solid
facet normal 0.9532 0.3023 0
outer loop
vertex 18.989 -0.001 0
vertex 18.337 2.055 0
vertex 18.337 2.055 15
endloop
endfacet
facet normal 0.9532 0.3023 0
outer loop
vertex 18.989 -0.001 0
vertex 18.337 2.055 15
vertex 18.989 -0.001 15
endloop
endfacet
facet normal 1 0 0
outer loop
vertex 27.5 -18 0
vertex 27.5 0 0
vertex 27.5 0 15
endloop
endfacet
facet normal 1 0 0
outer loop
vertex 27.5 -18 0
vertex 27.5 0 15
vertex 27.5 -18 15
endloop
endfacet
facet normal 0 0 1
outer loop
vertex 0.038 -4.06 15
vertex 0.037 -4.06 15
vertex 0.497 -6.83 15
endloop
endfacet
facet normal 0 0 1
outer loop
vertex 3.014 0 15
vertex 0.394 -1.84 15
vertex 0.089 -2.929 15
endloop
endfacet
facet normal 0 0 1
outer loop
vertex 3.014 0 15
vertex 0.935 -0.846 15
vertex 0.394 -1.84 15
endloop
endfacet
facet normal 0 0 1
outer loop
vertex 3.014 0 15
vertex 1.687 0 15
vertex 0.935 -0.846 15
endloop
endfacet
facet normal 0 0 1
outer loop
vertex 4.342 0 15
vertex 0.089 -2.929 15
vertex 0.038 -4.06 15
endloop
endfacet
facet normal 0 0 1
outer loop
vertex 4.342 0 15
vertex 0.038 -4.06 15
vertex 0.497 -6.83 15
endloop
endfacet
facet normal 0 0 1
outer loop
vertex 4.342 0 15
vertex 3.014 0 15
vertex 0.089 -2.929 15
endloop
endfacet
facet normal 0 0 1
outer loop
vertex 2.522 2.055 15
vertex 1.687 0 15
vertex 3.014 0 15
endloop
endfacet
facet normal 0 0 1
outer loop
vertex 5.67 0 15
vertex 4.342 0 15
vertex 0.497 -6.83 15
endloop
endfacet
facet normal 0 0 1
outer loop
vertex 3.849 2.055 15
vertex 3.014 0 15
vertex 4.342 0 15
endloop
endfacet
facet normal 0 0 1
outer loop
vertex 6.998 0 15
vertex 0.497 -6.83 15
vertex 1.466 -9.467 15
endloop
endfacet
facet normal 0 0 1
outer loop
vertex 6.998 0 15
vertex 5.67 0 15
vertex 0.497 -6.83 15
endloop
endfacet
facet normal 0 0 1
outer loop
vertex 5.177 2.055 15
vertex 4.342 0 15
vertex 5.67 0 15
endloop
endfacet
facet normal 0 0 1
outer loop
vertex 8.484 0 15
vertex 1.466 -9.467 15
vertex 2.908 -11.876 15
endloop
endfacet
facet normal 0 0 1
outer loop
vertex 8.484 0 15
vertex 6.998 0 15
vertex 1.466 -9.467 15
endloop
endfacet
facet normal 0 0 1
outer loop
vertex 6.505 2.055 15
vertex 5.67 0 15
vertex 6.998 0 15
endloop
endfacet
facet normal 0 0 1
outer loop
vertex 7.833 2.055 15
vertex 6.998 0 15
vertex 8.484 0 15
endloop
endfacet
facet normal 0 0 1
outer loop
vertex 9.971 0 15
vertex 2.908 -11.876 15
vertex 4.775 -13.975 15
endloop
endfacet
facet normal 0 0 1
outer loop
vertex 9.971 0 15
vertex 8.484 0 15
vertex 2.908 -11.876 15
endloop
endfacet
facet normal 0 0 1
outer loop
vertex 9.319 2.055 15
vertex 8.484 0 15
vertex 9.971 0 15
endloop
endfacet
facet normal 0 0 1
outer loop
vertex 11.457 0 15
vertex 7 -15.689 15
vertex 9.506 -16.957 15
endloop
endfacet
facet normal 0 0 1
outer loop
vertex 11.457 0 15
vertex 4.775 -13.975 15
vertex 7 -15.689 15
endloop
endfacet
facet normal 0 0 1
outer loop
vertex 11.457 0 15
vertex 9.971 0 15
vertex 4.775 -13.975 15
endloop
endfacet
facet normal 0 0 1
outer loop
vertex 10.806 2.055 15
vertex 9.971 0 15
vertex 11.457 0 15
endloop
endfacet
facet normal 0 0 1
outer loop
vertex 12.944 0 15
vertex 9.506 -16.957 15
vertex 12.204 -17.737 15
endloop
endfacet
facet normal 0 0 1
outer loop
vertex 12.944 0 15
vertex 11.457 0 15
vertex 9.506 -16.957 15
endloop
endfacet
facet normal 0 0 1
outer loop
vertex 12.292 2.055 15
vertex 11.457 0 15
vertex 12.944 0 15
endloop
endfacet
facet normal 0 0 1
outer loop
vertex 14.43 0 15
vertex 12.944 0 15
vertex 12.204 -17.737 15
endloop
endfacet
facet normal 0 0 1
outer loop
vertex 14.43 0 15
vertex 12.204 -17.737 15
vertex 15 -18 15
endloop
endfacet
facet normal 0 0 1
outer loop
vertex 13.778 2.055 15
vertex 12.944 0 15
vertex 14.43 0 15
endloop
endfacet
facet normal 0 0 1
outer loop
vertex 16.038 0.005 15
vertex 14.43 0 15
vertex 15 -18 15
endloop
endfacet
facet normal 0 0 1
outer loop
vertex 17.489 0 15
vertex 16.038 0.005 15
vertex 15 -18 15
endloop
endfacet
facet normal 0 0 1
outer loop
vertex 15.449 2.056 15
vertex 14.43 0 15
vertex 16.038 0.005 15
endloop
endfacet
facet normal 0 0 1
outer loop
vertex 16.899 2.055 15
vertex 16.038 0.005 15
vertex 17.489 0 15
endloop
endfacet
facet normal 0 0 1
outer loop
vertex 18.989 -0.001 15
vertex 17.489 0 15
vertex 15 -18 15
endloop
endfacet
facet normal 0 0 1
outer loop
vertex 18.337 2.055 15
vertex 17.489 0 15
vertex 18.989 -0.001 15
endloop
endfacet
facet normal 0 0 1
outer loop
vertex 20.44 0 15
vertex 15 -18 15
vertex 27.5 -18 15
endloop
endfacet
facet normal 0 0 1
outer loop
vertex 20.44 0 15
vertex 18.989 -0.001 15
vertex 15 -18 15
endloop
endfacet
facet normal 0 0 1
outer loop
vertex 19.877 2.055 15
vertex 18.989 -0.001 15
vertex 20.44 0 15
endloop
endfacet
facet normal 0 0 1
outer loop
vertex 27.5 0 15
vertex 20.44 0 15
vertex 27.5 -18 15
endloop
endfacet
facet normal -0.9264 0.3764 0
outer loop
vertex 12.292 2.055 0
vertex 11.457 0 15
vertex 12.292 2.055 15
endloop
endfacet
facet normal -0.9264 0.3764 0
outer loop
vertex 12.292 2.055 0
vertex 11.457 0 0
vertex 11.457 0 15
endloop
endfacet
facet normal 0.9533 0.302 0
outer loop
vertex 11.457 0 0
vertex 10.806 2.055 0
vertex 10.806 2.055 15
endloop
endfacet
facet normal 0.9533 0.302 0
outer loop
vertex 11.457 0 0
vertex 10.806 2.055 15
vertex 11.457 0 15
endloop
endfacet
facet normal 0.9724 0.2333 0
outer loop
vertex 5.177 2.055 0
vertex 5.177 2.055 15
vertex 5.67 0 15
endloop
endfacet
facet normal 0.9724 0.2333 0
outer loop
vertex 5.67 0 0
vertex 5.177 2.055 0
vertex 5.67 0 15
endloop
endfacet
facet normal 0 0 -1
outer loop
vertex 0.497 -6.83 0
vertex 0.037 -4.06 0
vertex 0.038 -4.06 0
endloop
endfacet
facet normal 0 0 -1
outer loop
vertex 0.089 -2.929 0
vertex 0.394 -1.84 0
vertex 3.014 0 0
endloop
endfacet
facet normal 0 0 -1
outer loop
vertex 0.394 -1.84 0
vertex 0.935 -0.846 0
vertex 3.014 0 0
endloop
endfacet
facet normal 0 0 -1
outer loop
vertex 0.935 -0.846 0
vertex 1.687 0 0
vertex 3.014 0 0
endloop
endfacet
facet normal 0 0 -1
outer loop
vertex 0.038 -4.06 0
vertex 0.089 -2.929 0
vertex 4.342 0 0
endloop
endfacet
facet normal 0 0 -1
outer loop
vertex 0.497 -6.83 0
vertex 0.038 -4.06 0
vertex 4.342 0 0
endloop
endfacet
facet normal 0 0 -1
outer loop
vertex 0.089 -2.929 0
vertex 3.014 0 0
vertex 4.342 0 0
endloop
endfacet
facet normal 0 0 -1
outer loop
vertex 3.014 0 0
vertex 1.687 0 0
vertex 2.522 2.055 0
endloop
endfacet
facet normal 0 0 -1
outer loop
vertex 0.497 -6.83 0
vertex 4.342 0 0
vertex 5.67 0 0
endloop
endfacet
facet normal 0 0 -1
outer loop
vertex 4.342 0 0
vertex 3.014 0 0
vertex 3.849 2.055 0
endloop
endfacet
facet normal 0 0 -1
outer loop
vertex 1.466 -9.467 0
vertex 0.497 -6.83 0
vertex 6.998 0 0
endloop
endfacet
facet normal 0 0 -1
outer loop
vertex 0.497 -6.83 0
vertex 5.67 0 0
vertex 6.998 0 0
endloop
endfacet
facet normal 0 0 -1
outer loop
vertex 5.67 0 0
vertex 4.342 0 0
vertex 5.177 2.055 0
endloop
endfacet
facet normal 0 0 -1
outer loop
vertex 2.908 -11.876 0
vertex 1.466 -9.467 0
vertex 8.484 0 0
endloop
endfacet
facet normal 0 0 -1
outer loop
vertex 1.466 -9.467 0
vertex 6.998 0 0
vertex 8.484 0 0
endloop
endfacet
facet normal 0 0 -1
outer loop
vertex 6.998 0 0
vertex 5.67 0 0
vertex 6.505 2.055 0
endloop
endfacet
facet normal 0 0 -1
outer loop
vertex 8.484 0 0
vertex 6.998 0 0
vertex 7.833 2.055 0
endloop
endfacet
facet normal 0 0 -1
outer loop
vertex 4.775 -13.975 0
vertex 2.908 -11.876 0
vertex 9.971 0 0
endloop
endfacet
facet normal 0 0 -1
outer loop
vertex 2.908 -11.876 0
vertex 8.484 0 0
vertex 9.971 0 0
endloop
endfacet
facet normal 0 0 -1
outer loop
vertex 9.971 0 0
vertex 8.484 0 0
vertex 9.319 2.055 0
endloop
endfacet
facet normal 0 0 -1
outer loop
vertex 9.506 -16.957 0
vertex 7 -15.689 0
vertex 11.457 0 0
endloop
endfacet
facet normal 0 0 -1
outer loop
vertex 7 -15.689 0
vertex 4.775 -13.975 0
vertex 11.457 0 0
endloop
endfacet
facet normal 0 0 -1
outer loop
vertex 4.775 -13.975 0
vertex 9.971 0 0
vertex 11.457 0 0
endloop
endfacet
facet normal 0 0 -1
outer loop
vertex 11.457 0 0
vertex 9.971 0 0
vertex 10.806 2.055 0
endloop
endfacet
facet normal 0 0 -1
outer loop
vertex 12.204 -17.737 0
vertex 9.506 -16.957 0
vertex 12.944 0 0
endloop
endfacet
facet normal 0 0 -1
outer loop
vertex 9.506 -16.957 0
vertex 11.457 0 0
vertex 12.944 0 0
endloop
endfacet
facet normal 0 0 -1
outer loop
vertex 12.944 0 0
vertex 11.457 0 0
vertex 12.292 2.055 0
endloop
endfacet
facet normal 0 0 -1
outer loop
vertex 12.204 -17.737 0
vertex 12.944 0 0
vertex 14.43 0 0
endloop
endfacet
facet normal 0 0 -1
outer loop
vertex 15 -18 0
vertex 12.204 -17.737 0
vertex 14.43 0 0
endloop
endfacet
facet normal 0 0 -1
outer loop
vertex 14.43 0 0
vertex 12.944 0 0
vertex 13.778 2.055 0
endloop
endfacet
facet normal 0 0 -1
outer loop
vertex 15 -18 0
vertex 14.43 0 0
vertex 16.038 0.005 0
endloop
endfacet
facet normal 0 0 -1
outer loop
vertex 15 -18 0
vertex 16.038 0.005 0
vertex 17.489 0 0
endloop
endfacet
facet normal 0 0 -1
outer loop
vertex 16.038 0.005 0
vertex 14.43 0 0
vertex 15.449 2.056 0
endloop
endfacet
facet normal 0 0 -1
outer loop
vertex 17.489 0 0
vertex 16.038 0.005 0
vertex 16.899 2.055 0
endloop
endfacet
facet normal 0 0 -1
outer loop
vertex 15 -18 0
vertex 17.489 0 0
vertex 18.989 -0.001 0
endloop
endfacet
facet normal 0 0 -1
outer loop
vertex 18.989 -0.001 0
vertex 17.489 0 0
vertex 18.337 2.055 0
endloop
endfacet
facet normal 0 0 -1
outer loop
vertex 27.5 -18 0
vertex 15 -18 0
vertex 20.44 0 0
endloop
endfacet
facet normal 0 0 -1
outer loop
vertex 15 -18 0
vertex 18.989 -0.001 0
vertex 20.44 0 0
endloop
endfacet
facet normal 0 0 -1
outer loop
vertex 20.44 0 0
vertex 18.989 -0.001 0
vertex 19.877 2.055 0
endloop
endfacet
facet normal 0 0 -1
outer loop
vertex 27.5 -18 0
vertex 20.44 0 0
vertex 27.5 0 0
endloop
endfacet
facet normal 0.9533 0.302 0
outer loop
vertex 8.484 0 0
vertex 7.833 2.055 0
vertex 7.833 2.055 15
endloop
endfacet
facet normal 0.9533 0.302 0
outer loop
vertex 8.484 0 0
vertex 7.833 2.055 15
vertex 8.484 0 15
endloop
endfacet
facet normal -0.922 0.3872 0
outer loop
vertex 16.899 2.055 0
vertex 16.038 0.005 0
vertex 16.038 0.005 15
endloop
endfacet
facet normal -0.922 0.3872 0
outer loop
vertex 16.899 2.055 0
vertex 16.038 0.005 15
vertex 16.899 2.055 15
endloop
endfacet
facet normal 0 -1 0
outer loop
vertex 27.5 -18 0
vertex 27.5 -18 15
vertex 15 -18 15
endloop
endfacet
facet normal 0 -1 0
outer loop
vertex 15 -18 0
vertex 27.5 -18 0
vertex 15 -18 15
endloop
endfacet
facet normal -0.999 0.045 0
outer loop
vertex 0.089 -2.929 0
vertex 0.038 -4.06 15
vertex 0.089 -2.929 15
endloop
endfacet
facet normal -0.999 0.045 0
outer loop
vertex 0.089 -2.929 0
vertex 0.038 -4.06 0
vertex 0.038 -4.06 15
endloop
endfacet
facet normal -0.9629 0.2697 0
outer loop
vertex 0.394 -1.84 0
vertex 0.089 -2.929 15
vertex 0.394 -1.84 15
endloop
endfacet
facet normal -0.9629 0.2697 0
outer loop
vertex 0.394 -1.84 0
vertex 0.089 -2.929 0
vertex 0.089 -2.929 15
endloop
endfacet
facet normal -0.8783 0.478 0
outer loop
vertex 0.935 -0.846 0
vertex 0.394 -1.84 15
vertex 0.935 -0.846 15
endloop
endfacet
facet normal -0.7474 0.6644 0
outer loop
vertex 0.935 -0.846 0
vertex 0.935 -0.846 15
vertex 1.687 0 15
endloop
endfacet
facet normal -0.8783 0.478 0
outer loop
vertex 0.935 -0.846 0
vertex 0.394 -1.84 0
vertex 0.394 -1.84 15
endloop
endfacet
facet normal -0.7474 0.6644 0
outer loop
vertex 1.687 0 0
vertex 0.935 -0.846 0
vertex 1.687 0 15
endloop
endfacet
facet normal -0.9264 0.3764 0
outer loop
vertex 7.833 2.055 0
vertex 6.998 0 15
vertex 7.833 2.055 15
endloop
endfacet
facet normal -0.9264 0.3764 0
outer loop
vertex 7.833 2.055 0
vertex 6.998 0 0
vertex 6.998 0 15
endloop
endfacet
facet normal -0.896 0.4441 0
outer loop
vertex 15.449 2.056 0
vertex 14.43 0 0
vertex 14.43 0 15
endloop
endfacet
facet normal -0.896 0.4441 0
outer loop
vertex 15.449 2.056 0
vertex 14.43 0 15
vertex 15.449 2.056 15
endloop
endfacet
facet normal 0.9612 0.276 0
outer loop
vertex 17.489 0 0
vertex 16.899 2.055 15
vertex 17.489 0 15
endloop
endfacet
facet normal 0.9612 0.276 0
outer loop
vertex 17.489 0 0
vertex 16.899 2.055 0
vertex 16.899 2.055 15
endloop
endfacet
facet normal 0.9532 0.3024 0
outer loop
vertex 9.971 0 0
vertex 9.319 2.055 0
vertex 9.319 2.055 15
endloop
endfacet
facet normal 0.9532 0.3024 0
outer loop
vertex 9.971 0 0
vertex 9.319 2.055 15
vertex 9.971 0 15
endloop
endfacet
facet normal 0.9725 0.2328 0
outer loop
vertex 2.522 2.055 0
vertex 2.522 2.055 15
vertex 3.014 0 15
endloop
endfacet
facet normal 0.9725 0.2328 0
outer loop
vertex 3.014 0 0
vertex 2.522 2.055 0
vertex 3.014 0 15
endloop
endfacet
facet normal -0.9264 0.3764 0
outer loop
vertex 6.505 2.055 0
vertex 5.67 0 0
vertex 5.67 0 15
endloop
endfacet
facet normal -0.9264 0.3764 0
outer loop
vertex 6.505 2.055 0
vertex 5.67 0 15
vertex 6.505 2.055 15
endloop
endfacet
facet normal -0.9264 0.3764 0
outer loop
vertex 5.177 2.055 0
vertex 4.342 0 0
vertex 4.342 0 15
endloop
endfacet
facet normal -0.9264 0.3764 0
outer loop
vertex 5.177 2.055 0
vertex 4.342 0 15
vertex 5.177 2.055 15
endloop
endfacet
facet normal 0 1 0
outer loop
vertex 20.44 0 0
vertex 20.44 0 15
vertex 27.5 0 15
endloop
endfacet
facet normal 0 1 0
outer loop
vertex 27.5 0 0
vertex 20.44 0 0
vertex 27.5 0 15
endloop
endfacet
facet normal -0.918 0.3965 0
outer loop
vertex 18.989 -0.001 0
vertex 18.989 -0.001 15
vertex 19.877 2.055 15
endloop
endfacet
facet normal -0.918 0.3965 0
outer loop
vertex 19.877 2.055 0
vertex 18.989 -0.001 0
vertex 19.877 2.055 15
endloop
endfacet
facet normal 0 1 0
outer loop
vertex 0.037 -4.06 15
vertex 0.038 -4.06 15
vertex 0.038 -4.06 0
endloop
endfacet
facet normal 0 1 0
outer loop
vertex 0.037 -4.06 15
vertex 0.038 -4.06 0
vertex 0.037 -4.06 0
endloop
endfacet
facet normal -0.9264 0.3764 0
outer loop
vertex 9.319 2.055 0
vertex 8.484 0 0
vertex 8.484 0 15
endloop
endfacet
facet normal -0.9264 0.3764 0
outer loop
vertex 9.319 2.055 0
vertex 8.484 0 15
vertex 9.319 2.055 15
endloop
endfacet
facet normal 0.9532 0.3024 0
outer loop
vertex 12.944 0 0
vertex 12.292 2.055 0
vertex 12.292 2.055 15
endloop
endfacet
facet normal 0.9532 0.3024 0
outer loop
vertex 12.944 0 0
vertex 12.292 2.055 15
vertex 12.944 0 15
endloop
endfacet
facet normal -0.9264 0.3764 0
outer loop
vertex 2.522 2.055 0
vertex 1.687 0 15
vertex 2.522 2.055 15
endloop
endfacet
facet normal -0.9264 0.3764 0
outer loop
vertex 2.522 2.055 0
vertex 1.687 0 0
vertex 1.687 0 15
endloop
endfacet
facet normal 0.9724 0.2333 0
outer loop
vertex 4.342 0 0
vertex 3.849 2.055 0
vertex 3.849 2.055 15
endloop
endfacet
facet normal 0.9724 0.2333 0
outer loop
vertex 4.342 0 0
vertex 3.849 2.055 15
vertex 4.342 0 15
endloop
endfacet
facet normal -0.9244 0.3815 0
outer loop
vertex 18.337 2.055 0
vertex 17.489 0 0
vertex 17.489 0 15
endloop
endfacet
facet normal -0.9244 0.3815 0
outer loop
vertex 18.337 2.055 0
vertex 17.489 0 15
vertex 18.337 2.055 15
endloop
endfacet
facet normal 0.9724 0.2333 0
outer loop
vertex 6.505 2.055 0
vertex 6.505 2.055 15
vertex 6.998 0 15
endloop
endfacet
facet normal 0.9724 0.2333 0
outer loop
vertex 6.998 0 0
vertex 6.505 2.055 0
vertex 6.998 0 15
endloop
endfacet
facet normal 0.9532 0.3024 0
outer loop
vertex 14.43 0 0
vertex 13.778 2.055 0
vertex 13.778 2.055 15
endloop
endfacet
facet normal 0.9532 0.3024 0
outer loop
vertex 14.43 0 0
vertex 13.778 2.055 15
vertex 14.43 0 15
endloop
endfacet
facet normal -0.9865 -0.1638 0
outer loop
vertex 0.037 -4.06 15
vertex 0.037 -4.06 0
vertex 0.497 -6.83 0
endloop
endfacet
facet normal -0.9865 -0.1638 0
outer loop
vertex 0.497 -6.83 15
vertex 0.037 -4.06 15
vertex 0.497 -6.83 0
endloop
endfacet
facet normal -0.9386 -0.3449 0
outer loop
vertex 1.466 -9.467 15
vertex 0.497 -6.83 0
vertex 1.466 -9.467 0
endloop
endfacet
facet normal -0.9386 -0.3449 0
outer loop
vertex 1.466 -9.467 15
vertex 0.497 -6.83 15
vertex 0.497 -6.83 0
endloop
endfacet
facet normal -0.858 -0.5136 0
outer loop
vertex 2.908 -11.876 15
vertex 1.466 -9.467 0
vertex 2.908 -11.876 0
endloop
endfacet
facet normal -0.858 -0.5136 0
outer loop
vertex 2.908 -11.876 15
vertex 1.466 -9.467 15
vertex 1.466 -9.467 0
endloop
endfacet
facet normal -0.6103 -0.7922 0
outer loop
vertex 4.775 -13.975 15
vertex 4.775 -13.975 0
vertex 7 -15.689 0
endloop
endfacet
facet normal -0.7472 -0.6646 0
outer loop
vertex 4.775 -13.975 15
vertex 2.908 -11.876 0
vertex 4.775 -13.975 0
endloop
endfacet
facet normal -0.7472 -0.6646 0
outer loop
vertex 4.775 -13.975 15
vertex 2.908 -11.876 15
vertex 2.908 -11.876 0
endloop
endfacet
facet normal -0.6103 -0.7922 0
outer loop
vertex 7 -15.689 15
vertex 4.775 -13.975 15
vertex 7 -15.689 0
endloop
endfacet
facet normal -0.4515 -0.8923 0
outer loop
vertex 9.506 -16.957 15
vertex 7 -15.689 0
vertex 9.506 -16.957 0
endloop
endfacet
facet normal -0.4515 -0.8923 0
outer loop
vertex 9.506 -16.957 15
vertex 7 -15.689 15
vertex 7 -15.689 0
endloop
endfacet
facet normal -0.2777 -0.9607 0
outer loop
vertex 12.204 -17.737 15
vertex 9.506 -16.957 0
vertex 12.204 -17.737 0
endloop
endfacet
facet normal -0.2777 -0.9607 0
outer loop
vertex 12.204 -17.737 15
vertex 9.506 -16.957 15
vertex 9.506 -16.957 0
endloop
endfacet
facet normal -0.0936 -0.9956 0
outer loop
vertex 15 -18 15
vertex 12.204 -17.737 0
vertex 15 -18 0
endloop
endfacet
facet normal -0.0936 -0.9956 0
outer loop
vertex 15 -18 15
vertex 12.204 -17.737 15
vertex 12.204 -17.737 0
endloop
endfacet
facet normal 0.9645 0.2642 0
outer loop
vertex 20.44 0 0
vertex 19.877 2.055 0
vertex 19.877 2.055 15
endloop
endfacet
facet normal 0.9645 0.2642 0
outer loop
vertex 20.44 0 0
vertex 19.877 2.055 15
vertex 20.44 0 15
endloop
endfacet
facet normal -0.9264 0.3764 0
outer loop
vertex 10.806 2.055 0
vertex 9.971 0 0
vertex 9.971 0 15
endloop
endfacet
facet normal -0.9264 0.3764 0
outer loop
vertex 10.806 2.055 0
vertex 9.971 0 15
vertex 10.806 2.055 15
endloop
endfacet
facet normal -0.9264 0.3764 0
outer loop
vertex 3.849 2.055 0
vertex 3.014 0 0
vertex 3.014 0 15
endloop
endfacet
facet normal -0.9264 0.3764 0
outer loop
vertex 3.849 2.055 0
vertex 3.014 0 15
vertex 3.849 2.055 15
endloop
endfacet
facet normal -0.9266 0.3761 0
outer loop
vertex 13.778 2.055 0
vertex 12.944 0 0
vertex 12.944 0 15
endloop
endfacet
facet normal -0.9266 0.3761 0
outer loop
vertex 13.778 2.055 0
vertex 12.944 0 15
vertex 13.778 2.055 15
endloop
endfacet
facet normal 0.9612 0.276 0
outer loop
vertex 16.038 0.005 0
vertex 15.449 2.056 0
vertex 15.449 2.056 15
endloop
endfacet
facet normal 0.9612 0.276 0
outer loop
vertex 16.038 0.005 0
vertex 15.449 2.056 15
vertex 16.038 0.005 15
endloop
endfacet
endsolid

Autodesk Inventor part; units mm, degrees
ref_plane "YZ Plane" through (0, 0, 0) normal (1, 0, 0) x (0, 1, 0)
ref_plane "XZ Plane" through (0, 0, 0) normal (0, 1, 0) x (-1, 0, 0)
ref_plane "XY Plane" through (0, 0, 0) normal (0, 0, 1) x (1, 0, 0)
sketch "Sketch5" plane through (0, 0, 0) normal (0, 0, 1) x (1, 0, 0)
  line L0 (27.5, -18) -> (0, -18)
  line L1 (0, -18) -> (0, 0)
  line L2 (27.5, -1.0645) -> (27.5, -18)
  line L3 (1.6866, 0) -> (2.5215, 2.0553)
  line L4 (2.5215, 2.0553) -> (3.0145, 0)
  line L5 (3.0145, 0) -> (3.8493, 2.0553)
  line L6 (3.8493, 2.0553) -> (4.3423, 0)
  line L7 (4.3423, 0) -> (5.1772, 2.0553)
  line L8 (5.1772, 2.0553) -> (5.6702, 0)
  line L9 (5.6702, 0) -> (6.505, 2.0553)
  line L10 (6.505, 2.0553) -> (6.998, 0)
  line L11 (6.998, 0) -> (7.8329, 2.0553)
  line L12 (7.8329, 2.0553) -> (8.4844, 0)
  line L13 (8.4844, 0) -> (9.3192, 2.0553)
  line L14 (9.3192, 2.0553) -> (9.9707, 0)
  line L15 (9.9707, 0) -> (10.8056, 2.0553)
  line L16 (10.8056, 2.0553) -> (11.4571, 0)
  line L17 (11.4571, 0) -> (12.292, 2.0553)
  line L18 (12.292, 2.0553) -> (12.9435, 0)
  line L19 (12.9435, 0) -> (13.7783, 2.0553)
  line L20 (13.7783, 2.0553) -> (14.4298, 0)
  line L21 (14.4298, 0) -> (15.4488, 2.0563)
  line L22 (15.4488, 2.0563) -> (16.0375, 0.0047)
  line L23 (16.0375, 0.0047) -> (16.8992, 2.0553)
  line L24 (16.8992, 2.0553) -> (17.489, 0)
  line L25 (0, 0) -> (1.6866, 0)
  line L26 (0, 0) -> (1.6866, 0)
  line L27 (17.489, 0) -> (18.3372, 2.0553)
  line L28 (18.3372, 2.0553) -> (18.989, -0.0011)
  line L29 (27.5, -0.0004) -> (27.5, -1.0645)
  line L30 (18.989, -0.0011) -> (19.8773, 2.0553)
  line L31 (19.8773, 2.0553) -> (20.4405, -0.0004)
  line L32 (15.4483, 2.0553) -> (15.4491, 2.0553)
  line L33 (18.9887, 0) -> (18.9895, 0)
  line L34 (20.4405, -0.0004) -> (27.5, -0.0004)
  point P0 (20.4491, -0.0317)
  dimension "d97" = 18
  dimension "d106" = 27.5
extrude "Extrusion2" add sketch "Sketch5" along normal blind 15
fillet "Fillet2" radius 15 1 edges at (0, -18, 7.5)
fillet "Rundung3" radius 5 1 edges at (0, 0, 7.5)
equation "\"l1\" = 8"
properties part number "Maria_Greifer_3D-Druck"
